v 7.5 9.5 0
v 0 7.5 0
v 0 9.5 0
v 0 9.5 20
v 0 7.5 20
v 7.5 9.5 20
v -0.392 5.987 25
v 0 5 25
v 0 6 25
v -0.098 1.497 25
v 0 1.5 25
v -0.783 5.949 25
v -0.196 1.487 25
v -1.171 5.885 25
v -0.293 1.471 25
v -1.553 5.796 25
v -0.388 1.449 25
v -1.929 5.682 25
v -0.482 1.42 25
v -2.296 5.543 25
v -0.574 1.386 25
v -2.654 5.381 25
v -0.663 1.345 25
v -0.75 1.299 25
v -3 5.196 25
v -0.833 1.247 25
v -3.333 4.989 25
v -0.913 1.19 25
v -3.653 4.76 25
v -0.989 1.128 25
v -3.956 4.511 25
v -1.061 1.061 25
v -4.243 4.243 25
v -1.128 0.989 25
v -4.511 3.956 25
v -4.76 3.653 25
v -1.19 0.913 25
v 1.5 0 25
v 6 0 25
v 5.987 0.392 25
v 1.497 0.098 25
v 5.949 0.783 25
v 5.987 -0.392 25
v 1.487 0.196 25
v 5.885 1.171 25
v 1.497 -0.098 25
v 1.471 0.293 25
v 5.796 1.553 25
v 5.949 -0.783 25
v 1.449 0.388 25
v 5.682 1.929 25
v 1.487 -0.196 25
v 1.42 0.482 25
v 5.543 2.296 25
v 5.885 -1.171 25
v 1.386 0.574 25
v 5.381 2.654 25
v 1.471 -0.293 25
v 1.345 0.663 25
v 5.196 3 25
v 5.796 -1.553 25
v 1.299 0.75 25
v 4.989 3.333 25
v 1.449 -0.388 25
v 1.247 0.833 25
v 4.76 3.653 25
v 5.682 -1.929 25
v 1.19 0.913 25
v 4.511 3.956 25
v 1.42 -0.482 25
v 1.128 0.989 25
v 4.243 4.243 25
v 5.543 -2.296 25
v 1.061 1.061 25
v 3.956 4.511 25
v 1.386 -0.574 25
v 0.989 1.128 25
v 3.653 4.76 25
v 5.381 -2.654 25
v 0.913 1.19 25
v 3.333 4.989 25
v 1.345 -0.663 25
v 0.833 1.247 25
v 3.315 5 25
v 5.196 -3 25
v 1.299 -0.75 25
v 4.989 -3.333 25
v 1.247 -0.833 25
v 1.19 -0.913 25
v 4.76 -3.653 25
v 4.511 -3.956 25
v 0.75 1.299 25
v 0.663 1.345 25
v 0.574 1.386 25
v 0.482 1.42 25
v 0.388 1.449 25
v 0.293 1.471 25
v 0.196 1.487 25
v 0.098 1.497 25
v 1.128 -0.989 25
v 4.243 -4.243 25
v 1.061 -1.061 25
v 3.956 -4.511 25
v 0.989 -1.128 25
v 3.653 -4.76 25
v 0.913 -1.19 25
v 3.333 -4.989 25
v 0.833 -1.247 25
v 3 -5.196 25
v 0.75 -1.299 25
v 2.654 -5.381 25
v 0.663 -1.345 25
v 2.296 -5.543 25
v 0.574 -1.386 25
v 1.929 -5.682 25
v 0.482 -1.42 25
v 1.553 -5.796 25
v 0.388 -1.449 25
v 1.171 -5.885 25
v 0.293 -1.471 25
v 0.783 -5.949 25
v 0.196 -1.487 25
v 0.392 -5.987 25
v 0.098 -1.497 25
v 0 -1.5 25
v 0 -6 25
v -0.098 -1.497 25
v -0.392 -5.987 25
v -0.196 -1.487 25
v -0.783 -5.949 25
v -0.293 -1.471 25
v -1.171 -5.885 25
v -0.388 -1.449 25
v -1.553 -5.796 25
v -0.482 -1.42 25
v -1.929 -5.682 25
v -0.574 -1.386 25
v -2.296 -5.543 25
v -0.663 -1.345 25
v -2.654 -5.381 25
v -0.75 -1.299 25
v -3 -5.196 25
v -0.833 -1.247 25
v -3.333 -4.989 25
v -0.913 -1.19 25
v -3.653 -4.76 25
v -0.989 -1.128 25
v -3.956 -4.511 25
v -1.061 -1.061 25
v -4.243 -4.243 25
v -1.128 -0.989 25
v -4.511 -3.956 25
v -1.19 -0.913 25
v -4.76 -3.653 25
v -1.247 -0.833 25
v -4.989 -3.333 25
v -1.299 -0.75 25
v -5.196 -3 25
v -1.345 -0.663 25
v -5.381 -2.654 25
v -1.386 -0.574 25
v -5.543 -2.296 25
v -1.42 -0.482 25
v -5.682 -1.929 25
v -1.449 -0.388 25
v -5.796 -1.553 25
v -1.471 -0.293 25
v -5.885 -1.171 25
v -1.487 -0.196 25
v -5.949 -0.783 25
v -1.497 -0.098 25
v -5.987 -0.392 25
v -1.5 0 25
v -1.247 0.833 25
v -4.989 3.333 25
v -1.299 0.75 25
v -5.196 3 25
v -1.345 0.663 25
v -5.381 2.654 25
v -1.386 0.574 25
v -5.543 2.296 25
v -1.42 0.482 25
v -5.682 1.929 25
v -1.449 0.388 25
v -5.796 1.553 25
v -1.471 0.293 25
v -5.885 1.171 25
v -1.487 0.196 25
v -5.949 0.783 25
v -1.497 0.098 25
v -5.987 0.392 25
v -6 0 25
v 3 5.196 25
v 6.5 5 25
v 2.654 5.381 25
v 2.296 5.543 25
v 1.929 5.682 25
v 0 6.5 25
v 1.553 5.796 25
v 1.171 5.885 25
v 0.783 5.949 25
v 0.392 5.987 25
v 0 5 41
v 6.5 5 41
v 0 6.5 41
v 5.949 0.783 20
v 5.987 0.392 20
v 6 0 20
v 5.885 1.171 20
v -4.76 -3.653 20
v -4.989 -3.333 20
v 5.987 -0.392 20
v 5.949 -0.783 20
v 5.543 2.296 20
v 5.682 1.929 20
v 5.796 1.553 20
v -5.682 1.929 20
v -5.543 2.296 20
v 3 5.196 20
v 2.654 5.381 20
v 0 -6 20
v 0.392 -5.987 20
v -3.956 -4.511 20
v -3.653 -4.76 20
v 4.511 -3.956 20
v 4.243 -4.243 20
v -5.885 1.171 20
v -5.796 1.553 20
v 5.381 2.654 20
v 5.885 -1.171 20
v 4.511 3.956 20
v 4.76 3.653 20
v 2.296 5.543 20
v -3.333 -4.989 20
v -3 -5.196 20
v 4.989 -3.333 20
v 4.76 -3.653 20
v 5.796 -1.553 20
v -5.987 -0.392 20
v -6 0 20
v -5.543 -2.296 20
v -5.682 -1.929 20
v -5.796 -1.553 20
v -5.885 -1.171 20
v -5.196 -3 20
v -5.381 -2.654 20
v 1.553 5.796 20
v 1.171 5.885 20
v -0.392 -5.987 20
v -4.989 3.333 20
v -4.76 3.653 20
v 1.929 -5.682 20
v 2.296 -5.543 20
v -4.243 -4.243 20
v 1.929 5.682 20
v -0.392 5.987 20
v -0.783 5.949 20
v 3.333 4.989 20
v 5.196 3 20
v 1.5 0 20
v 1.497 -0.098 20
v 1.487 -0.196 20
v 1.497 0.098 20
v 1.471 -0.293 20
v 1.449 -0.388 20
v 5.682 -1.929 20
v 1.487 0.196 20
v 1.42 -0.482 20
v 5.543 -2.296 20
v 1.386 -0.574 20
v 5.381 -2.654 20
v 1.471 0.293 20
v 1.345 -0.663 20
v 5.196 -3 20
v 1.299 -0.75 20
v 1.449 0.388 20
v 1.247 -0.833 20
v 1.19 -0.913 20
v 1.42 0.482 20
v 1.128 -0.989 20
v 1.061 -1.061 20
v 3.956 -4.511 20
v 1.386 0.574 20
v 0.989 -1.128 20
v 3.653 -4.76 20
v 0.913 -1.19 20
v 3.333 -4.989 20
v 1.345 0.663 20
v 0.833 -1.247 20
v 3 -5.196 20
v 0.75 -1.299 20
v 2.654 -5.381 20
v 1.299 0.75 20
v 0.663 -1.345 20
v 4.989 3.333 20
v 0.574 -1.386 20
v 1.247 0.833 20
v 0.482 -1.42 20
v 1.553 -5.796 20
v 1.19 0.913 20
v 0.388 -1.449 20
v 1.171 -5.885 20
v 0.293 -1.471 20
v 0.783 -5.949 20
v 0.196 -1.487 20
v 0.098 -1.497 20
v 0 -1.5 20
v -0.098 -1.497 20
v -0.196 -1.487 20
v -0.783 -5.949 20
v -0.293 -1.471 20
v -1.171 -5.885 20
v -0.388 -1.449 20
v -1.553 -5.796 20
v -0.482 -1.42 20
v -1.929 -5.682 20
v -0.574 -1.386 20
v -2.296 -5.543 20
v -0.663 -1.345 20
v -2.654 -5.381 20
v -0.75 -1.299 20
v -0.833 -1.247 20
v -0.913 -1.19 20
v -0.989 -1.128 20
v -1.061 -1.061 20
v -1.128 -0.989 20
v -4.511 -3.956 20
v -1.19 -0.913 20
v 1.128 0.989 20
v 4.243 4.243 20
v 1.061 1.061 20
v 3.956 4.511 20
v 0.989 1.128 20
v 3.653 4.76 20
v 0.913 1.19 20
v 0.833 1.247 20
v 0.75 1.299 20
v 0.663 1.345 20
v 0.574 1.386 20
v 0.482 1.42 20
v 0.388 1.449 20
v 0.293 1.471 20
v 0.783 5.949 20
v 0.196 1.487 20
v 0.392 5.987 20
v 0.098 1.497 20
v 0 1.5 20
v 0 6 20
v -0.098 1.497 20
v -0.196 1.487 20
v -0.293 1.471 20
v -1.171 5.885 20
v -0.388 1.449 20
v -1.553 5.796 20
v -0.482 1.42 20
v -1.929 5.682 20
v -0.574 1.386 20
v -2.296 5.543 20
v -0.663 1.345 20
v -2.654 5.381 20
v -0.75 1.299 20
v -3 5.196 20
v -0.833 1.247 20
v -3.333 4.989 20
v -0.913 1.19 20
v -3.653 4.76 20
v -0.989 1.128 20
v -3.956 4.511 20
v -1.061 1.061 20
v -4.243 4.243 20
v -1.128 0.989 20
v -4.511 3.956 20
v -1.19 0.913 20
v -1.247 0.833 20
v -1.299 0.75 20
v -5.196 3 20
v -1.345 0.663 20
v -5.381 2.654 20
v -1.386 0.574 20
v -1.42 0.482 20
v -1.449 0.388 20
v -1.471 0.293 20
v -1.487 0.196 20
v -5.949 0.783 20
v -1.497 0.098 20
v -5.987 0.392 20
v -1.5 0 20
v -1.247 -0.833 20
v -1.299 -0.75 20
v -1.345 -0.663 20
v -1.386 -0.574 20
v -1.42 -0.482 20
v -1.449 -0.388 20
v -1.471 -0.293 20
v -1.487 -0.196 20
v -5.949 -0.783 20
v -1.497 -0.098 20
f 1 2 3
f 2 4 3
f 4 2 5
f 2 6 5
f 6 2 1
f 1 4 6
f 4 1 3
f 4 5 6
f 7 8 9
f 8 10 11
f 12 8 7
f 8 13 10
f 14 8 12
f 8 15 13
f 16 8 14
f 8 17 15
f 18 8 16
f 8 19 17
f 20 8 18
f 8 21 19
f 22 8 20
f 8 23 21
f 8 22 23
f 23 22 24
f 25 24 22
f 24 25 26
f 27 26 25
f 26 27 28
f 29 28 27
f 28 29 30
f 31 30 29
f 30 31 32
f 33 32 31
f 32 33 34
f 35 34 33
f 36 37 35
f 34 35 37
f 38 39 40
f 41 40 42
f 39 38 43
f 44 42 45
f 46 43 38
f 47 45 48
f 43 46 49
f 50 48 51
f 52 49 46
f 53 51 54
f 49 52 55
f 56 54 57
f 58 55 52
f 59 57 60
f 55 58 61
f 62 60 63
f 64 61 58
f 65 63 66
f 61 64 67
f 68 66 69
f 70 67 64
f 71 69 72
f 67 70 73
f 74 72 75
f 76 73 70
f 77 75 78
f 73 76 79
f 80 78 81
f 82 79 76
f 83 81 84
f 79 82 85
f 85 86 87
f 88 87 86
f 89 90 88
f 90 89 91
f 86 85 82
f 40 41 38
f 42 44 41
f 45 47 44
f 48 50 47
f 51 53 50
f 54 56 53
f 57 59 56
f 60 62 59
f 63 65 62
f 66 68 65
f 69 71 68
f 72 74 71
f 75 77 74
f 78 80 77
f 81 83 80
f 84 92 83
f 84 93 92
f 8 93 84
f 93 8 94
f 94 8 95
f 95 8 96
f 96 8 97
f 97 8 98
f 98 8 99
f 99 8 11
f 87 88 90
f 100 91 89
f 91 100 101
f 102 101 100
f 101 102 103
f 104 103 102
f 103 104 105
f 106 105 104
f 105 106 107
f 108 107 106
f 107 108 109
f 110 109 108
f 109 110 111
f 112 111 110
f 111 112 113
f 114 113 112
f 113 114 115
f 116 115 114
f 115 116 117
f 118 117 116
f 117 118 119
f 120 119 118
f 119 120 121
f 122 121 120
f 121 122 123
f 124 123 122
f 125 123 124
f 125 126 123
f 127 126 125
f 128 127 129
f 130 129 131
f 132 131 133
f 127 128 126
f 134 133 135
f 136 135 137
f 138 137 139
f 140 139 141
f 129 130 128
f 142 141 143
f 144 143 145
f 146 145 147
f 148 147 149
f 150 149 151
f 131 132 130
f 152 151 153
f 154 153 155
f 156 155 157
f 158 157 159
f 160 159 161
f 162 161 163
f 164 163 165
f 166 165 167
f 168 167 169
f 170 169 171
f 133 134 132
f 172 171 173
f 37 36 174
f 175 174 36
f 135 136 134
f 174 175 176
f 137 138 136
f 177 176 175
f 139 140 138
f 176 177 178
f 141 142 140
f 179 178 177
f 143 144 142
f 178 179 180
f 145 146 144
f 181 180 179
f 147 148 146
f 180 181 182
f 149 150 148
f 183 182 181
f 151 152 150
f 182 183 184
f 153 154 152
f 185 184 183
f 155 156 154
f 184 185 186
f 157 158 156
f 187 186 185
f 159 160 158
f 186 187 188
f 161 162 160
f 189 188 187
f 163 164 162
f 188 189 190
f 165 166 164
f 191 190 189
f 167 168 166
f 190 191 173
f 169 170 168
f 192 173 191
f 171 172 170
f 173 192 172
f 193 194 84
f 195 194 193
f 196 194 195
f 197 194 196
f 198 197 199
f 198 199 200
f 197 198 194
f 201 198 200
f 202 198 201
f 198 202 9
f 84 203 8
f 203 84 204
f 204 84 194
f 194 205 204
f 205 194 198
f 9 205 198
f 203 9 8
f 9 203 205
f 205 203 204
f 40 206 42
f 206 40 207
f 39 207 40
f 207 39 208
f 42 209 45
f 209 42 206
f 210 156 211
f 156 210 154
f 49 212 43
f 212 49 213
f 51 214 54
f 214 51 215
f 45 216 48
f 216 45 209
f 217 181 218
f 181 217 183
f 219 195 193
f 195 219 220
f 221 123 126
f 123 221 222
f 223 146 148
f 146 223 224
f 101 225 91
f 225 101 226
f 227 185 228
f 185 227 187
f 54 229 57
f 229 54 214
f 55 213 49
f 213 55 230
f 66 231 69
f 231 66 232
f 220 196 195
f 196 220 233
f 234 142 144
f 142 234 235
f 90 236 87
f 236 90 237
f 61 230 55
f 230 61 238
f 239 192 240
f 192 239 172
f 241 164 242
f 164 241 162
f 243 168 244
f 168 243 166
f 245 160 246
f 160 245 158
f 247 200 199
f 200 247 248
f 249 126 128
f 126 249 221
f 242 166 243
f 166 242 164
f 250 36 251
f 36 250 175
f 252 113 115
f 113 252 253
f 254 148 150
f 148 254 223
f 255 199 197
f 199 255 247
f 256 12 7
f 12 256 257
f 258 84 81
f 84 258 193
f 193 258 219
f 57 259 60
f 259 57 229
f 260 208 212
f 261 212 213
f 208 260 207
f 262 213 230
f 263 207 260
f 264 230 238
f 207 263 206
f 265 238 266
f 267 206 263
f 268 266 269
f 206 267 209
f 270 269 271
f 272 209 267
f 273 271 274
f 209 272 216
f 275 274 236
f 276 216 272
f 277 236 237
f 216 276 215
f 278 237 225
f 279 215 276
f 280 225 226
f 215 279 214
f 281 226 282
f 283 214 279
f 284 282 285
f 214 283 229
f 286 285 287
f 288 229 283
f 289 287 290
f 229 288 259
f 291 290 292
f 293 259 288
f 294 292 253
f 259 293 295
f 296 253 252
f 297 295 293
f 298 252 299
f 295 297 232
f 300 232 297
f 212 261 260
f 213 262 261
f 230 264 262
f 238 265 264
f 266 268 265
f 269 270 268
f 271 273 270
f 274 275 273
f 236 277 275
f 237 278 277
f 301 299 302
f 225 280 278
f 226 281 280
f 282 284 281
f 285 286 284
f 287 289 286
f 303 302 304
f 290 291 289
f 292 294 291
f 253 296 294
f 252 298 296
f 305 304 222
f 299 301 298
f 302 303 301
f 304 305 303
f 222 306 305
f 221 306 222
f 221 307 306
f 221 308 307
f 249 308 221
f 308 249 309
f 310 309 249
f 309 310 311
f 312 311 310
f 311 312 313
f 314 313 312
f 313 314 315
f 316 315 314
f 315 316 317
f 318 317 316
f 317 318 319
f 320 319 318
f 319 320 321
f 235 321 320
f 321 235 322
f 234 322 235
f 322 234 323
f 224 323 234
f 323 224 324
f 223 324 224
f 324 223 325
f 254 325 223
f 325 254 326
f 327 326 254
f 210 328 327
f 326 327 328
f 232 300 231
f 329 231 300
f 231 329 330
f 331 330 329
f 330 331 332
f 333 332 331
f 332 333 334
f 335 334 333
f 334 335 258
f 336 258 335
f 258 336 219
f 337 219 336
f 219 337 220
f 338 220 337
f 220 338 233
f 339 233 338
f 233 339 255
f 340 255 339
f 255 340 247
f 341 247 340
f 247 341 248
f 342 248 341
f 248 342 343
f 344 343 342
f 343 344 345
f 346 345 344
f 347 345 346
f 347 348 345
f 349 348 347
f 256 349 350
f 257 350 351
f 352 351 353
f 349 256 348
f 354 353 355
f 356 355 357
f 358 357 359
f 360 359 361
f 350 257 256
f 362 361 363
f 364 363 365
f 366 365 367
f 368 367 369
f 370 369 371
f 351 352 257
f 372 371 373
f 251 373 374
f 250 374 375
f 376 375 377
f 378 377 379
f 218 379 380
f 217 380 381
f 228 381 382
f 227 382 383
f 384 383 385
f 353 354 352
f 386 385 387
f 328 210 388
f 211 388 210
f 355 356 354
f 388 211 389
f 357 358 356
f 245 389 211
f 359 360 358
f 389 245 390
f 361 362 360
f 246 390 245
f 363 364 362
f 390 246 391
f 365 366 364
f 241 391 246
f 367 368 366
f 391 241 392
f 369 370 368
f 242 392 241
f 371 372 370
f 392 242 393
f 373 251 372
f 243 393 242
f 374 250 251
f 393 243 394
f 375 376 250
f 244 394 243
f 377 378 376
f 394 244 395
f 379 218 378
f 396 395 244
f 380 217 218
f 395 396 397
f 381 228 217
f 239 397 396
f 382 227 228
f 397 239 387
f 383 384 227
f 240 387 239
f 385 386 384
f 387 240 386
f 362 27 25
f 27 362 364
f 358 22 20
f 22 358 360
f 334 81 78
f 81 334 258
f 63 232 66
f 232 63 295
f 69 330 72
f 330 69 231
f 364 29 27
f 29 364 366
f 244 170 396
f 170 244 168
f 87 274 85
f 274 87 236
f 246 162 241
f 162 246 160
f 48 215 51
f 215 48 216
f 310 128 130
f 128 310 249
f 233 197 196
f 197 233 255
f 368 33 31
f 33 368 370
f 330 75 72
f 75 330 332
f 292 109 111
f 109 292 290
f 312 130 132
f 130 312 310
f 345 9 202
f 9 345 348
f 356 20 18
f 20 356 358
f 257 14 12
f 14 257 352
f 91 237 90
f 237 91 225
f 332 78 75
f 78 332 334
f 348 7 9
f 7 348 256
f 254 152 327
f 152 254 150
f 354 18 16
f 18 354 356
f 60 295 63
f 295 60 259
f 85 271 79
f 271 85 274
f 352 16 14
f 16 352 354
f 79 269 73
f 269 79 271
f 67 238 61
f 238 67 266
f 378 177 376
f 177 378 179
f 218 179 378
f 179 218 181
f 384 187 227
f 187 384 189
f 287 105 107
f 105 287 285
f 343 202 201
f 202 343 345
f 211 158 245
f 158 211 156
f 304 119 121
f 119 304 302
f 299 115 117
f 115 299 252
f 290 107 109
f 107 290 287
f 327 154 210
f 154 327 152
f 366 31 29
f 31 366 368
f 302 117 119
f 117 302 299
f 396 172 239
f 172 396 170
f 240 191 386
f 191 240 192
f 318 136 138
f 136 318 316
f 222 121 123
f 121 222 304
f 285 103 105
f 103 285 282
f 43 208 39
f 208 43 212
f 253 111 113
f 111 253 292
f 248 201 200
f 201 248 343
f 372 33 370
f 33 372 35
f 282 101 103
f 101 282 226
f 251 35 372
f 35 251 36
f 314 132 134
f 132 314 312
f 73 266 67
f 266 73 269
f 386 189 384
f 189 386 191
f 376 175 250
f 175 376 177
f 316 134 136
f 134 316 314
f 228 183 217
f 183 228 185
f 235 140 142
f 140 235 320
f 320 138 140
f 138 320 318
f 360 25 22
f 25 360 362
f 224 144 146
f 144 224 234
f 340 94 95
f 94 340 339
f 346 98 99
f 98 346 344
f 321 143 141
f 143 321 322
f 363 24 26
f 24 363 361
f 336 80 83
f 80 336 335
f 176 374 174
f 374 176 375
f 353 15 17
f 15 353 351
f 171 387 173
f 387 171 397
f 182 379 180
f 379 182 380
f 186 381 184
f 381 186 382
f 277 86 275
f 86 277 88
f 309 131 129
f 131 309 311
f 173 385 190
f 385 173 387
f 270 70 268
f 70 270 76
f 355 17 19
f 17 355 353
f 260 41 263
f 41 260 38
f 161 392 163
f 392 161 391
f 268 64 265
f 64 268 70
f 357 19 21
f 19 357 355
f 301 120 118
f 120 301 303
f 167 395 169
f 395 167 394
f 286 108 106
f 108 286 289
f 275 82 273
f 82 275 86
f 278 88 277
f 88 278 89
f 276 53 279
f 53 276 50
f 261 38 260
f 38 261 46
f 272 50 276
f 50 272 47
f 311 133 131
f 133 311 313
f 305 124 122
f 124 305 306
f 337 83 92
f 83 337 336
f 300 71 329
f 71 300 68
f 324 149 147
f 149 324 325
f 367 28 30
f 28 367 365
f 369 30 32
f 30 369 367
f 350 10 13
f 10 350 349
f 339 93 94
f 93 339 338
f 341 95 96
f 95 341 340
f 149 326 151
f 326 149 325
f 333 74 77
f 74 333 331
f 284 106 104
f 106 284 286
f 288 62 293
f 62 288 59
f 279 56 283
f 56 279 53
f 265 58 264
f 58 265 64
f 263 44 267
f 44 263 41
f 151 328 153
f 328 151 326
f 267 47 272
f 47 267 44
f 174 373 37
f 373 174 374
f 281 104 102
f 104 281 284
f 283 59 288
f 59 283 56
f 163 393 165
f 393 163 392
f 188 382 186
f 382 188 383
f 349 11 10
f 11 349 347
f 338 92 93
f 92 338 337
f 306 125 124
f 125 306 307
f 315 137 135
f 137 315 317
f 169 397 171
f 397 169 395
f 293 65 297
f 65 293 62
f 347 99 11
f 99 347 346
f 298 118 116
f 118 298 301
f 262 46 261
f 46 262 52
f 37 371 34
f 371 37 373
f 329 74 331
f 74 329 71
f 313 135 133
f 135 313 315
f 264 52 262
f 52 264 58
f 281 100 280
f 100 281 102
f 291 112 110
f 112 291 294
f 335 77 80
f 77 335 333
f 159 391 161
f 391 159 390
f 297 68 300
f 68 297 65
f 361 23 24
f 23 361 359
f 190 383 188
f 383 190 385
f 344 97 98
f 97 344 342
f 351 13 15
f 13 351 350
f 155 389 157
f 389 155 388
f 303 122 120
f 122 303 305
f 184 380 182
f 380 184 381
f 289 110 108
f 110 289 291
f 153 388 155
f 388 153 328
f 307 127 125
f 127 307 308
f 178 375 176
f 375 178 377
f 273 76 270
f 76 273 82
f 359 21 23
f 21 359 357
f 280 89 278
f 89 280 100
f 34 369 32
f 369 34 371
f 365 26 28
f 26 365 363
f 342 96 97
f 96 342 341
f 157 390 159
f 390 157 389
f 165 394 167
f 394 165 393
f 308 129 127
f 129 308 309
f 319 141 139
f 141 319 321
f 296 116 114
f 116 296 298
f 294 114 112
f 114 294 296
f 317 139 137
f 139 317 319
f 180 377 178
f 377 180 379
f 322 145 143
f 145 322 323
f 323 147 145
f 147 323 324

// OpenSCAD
// Hose-barb reducer: 8 mm tubing -> 5 mm tubing
// Print orientation: standing upright along +Z

$fn = 96;

// --- Dimensions (mm) ---
bore        = 3;     // through-bore diameter
barb_8_h    = 10;    // height of each 8 mm barb
barb_8_d0   = 7.5;   // 8 mm barb outer diameter at bottom
barb_8_d1   = 9.5;   // 8 mm barb outer diameter at top
barb_8_n    = 2;     // number of 8 mm barbs (stacked)
collar_d    = 12;    // cylindrical collar diameter
collar_h    = 5;     // collar height (z = 20 to 25)
barb_5_h    = 8;     // height of each 5 mm barb
barb_5_d0   = 6.5;   // 5 mm barb outer diameter at bottom
barb_5_d1   = 5.0;   // 5 mm barb outer diameter at top
barb_5_n    = 2;     // number of 5 mm barbs (stacked)
eps         = 0.5;   // overshoot for clean cuts

total_h = barb_8_n * barb_8_h + collar_h + barb_5_n * barb_5_h; // 41 mm

// --- Model ---
difference() {
    union() {
        // 8 mm barbs: sawtooth profile, stacked
        for (i = [0 : barb_8_n - 1])
            translate([0, 0, i * barb_8_h])
                linear_extrude(height = barb_8_h)
                    polygon(points = [
                        [0, barb_8_d0],
                        [0, barb_8_d1],
                        [barb_8_d0, barb_8_d1]
                    ]);

        // Collar
        translate([0, 0, barb_8_n * barb_8_h])
            cylinder(d = collar_d, h = collar_h);

        // 5 mm barbs: shrinking profile, stacked
        for (i = [0 : barb_5_n - 1])
            translate([0, 0, barb_8_n * barb_8_h + collar_h + i * barb_5_h])
                linear_extrude(height = barb_5_h)
                    polygon(points = [
                        [0, barb_5_d0],
                        [0, barb_5_d1],
                        [barb_5_d0, barb_5_d1]
                    ]);
    }

    // Through-bore
    translate([0, 0, -eps])
        cylinder(d = bore, h = total_h + 2 * eps);
}
